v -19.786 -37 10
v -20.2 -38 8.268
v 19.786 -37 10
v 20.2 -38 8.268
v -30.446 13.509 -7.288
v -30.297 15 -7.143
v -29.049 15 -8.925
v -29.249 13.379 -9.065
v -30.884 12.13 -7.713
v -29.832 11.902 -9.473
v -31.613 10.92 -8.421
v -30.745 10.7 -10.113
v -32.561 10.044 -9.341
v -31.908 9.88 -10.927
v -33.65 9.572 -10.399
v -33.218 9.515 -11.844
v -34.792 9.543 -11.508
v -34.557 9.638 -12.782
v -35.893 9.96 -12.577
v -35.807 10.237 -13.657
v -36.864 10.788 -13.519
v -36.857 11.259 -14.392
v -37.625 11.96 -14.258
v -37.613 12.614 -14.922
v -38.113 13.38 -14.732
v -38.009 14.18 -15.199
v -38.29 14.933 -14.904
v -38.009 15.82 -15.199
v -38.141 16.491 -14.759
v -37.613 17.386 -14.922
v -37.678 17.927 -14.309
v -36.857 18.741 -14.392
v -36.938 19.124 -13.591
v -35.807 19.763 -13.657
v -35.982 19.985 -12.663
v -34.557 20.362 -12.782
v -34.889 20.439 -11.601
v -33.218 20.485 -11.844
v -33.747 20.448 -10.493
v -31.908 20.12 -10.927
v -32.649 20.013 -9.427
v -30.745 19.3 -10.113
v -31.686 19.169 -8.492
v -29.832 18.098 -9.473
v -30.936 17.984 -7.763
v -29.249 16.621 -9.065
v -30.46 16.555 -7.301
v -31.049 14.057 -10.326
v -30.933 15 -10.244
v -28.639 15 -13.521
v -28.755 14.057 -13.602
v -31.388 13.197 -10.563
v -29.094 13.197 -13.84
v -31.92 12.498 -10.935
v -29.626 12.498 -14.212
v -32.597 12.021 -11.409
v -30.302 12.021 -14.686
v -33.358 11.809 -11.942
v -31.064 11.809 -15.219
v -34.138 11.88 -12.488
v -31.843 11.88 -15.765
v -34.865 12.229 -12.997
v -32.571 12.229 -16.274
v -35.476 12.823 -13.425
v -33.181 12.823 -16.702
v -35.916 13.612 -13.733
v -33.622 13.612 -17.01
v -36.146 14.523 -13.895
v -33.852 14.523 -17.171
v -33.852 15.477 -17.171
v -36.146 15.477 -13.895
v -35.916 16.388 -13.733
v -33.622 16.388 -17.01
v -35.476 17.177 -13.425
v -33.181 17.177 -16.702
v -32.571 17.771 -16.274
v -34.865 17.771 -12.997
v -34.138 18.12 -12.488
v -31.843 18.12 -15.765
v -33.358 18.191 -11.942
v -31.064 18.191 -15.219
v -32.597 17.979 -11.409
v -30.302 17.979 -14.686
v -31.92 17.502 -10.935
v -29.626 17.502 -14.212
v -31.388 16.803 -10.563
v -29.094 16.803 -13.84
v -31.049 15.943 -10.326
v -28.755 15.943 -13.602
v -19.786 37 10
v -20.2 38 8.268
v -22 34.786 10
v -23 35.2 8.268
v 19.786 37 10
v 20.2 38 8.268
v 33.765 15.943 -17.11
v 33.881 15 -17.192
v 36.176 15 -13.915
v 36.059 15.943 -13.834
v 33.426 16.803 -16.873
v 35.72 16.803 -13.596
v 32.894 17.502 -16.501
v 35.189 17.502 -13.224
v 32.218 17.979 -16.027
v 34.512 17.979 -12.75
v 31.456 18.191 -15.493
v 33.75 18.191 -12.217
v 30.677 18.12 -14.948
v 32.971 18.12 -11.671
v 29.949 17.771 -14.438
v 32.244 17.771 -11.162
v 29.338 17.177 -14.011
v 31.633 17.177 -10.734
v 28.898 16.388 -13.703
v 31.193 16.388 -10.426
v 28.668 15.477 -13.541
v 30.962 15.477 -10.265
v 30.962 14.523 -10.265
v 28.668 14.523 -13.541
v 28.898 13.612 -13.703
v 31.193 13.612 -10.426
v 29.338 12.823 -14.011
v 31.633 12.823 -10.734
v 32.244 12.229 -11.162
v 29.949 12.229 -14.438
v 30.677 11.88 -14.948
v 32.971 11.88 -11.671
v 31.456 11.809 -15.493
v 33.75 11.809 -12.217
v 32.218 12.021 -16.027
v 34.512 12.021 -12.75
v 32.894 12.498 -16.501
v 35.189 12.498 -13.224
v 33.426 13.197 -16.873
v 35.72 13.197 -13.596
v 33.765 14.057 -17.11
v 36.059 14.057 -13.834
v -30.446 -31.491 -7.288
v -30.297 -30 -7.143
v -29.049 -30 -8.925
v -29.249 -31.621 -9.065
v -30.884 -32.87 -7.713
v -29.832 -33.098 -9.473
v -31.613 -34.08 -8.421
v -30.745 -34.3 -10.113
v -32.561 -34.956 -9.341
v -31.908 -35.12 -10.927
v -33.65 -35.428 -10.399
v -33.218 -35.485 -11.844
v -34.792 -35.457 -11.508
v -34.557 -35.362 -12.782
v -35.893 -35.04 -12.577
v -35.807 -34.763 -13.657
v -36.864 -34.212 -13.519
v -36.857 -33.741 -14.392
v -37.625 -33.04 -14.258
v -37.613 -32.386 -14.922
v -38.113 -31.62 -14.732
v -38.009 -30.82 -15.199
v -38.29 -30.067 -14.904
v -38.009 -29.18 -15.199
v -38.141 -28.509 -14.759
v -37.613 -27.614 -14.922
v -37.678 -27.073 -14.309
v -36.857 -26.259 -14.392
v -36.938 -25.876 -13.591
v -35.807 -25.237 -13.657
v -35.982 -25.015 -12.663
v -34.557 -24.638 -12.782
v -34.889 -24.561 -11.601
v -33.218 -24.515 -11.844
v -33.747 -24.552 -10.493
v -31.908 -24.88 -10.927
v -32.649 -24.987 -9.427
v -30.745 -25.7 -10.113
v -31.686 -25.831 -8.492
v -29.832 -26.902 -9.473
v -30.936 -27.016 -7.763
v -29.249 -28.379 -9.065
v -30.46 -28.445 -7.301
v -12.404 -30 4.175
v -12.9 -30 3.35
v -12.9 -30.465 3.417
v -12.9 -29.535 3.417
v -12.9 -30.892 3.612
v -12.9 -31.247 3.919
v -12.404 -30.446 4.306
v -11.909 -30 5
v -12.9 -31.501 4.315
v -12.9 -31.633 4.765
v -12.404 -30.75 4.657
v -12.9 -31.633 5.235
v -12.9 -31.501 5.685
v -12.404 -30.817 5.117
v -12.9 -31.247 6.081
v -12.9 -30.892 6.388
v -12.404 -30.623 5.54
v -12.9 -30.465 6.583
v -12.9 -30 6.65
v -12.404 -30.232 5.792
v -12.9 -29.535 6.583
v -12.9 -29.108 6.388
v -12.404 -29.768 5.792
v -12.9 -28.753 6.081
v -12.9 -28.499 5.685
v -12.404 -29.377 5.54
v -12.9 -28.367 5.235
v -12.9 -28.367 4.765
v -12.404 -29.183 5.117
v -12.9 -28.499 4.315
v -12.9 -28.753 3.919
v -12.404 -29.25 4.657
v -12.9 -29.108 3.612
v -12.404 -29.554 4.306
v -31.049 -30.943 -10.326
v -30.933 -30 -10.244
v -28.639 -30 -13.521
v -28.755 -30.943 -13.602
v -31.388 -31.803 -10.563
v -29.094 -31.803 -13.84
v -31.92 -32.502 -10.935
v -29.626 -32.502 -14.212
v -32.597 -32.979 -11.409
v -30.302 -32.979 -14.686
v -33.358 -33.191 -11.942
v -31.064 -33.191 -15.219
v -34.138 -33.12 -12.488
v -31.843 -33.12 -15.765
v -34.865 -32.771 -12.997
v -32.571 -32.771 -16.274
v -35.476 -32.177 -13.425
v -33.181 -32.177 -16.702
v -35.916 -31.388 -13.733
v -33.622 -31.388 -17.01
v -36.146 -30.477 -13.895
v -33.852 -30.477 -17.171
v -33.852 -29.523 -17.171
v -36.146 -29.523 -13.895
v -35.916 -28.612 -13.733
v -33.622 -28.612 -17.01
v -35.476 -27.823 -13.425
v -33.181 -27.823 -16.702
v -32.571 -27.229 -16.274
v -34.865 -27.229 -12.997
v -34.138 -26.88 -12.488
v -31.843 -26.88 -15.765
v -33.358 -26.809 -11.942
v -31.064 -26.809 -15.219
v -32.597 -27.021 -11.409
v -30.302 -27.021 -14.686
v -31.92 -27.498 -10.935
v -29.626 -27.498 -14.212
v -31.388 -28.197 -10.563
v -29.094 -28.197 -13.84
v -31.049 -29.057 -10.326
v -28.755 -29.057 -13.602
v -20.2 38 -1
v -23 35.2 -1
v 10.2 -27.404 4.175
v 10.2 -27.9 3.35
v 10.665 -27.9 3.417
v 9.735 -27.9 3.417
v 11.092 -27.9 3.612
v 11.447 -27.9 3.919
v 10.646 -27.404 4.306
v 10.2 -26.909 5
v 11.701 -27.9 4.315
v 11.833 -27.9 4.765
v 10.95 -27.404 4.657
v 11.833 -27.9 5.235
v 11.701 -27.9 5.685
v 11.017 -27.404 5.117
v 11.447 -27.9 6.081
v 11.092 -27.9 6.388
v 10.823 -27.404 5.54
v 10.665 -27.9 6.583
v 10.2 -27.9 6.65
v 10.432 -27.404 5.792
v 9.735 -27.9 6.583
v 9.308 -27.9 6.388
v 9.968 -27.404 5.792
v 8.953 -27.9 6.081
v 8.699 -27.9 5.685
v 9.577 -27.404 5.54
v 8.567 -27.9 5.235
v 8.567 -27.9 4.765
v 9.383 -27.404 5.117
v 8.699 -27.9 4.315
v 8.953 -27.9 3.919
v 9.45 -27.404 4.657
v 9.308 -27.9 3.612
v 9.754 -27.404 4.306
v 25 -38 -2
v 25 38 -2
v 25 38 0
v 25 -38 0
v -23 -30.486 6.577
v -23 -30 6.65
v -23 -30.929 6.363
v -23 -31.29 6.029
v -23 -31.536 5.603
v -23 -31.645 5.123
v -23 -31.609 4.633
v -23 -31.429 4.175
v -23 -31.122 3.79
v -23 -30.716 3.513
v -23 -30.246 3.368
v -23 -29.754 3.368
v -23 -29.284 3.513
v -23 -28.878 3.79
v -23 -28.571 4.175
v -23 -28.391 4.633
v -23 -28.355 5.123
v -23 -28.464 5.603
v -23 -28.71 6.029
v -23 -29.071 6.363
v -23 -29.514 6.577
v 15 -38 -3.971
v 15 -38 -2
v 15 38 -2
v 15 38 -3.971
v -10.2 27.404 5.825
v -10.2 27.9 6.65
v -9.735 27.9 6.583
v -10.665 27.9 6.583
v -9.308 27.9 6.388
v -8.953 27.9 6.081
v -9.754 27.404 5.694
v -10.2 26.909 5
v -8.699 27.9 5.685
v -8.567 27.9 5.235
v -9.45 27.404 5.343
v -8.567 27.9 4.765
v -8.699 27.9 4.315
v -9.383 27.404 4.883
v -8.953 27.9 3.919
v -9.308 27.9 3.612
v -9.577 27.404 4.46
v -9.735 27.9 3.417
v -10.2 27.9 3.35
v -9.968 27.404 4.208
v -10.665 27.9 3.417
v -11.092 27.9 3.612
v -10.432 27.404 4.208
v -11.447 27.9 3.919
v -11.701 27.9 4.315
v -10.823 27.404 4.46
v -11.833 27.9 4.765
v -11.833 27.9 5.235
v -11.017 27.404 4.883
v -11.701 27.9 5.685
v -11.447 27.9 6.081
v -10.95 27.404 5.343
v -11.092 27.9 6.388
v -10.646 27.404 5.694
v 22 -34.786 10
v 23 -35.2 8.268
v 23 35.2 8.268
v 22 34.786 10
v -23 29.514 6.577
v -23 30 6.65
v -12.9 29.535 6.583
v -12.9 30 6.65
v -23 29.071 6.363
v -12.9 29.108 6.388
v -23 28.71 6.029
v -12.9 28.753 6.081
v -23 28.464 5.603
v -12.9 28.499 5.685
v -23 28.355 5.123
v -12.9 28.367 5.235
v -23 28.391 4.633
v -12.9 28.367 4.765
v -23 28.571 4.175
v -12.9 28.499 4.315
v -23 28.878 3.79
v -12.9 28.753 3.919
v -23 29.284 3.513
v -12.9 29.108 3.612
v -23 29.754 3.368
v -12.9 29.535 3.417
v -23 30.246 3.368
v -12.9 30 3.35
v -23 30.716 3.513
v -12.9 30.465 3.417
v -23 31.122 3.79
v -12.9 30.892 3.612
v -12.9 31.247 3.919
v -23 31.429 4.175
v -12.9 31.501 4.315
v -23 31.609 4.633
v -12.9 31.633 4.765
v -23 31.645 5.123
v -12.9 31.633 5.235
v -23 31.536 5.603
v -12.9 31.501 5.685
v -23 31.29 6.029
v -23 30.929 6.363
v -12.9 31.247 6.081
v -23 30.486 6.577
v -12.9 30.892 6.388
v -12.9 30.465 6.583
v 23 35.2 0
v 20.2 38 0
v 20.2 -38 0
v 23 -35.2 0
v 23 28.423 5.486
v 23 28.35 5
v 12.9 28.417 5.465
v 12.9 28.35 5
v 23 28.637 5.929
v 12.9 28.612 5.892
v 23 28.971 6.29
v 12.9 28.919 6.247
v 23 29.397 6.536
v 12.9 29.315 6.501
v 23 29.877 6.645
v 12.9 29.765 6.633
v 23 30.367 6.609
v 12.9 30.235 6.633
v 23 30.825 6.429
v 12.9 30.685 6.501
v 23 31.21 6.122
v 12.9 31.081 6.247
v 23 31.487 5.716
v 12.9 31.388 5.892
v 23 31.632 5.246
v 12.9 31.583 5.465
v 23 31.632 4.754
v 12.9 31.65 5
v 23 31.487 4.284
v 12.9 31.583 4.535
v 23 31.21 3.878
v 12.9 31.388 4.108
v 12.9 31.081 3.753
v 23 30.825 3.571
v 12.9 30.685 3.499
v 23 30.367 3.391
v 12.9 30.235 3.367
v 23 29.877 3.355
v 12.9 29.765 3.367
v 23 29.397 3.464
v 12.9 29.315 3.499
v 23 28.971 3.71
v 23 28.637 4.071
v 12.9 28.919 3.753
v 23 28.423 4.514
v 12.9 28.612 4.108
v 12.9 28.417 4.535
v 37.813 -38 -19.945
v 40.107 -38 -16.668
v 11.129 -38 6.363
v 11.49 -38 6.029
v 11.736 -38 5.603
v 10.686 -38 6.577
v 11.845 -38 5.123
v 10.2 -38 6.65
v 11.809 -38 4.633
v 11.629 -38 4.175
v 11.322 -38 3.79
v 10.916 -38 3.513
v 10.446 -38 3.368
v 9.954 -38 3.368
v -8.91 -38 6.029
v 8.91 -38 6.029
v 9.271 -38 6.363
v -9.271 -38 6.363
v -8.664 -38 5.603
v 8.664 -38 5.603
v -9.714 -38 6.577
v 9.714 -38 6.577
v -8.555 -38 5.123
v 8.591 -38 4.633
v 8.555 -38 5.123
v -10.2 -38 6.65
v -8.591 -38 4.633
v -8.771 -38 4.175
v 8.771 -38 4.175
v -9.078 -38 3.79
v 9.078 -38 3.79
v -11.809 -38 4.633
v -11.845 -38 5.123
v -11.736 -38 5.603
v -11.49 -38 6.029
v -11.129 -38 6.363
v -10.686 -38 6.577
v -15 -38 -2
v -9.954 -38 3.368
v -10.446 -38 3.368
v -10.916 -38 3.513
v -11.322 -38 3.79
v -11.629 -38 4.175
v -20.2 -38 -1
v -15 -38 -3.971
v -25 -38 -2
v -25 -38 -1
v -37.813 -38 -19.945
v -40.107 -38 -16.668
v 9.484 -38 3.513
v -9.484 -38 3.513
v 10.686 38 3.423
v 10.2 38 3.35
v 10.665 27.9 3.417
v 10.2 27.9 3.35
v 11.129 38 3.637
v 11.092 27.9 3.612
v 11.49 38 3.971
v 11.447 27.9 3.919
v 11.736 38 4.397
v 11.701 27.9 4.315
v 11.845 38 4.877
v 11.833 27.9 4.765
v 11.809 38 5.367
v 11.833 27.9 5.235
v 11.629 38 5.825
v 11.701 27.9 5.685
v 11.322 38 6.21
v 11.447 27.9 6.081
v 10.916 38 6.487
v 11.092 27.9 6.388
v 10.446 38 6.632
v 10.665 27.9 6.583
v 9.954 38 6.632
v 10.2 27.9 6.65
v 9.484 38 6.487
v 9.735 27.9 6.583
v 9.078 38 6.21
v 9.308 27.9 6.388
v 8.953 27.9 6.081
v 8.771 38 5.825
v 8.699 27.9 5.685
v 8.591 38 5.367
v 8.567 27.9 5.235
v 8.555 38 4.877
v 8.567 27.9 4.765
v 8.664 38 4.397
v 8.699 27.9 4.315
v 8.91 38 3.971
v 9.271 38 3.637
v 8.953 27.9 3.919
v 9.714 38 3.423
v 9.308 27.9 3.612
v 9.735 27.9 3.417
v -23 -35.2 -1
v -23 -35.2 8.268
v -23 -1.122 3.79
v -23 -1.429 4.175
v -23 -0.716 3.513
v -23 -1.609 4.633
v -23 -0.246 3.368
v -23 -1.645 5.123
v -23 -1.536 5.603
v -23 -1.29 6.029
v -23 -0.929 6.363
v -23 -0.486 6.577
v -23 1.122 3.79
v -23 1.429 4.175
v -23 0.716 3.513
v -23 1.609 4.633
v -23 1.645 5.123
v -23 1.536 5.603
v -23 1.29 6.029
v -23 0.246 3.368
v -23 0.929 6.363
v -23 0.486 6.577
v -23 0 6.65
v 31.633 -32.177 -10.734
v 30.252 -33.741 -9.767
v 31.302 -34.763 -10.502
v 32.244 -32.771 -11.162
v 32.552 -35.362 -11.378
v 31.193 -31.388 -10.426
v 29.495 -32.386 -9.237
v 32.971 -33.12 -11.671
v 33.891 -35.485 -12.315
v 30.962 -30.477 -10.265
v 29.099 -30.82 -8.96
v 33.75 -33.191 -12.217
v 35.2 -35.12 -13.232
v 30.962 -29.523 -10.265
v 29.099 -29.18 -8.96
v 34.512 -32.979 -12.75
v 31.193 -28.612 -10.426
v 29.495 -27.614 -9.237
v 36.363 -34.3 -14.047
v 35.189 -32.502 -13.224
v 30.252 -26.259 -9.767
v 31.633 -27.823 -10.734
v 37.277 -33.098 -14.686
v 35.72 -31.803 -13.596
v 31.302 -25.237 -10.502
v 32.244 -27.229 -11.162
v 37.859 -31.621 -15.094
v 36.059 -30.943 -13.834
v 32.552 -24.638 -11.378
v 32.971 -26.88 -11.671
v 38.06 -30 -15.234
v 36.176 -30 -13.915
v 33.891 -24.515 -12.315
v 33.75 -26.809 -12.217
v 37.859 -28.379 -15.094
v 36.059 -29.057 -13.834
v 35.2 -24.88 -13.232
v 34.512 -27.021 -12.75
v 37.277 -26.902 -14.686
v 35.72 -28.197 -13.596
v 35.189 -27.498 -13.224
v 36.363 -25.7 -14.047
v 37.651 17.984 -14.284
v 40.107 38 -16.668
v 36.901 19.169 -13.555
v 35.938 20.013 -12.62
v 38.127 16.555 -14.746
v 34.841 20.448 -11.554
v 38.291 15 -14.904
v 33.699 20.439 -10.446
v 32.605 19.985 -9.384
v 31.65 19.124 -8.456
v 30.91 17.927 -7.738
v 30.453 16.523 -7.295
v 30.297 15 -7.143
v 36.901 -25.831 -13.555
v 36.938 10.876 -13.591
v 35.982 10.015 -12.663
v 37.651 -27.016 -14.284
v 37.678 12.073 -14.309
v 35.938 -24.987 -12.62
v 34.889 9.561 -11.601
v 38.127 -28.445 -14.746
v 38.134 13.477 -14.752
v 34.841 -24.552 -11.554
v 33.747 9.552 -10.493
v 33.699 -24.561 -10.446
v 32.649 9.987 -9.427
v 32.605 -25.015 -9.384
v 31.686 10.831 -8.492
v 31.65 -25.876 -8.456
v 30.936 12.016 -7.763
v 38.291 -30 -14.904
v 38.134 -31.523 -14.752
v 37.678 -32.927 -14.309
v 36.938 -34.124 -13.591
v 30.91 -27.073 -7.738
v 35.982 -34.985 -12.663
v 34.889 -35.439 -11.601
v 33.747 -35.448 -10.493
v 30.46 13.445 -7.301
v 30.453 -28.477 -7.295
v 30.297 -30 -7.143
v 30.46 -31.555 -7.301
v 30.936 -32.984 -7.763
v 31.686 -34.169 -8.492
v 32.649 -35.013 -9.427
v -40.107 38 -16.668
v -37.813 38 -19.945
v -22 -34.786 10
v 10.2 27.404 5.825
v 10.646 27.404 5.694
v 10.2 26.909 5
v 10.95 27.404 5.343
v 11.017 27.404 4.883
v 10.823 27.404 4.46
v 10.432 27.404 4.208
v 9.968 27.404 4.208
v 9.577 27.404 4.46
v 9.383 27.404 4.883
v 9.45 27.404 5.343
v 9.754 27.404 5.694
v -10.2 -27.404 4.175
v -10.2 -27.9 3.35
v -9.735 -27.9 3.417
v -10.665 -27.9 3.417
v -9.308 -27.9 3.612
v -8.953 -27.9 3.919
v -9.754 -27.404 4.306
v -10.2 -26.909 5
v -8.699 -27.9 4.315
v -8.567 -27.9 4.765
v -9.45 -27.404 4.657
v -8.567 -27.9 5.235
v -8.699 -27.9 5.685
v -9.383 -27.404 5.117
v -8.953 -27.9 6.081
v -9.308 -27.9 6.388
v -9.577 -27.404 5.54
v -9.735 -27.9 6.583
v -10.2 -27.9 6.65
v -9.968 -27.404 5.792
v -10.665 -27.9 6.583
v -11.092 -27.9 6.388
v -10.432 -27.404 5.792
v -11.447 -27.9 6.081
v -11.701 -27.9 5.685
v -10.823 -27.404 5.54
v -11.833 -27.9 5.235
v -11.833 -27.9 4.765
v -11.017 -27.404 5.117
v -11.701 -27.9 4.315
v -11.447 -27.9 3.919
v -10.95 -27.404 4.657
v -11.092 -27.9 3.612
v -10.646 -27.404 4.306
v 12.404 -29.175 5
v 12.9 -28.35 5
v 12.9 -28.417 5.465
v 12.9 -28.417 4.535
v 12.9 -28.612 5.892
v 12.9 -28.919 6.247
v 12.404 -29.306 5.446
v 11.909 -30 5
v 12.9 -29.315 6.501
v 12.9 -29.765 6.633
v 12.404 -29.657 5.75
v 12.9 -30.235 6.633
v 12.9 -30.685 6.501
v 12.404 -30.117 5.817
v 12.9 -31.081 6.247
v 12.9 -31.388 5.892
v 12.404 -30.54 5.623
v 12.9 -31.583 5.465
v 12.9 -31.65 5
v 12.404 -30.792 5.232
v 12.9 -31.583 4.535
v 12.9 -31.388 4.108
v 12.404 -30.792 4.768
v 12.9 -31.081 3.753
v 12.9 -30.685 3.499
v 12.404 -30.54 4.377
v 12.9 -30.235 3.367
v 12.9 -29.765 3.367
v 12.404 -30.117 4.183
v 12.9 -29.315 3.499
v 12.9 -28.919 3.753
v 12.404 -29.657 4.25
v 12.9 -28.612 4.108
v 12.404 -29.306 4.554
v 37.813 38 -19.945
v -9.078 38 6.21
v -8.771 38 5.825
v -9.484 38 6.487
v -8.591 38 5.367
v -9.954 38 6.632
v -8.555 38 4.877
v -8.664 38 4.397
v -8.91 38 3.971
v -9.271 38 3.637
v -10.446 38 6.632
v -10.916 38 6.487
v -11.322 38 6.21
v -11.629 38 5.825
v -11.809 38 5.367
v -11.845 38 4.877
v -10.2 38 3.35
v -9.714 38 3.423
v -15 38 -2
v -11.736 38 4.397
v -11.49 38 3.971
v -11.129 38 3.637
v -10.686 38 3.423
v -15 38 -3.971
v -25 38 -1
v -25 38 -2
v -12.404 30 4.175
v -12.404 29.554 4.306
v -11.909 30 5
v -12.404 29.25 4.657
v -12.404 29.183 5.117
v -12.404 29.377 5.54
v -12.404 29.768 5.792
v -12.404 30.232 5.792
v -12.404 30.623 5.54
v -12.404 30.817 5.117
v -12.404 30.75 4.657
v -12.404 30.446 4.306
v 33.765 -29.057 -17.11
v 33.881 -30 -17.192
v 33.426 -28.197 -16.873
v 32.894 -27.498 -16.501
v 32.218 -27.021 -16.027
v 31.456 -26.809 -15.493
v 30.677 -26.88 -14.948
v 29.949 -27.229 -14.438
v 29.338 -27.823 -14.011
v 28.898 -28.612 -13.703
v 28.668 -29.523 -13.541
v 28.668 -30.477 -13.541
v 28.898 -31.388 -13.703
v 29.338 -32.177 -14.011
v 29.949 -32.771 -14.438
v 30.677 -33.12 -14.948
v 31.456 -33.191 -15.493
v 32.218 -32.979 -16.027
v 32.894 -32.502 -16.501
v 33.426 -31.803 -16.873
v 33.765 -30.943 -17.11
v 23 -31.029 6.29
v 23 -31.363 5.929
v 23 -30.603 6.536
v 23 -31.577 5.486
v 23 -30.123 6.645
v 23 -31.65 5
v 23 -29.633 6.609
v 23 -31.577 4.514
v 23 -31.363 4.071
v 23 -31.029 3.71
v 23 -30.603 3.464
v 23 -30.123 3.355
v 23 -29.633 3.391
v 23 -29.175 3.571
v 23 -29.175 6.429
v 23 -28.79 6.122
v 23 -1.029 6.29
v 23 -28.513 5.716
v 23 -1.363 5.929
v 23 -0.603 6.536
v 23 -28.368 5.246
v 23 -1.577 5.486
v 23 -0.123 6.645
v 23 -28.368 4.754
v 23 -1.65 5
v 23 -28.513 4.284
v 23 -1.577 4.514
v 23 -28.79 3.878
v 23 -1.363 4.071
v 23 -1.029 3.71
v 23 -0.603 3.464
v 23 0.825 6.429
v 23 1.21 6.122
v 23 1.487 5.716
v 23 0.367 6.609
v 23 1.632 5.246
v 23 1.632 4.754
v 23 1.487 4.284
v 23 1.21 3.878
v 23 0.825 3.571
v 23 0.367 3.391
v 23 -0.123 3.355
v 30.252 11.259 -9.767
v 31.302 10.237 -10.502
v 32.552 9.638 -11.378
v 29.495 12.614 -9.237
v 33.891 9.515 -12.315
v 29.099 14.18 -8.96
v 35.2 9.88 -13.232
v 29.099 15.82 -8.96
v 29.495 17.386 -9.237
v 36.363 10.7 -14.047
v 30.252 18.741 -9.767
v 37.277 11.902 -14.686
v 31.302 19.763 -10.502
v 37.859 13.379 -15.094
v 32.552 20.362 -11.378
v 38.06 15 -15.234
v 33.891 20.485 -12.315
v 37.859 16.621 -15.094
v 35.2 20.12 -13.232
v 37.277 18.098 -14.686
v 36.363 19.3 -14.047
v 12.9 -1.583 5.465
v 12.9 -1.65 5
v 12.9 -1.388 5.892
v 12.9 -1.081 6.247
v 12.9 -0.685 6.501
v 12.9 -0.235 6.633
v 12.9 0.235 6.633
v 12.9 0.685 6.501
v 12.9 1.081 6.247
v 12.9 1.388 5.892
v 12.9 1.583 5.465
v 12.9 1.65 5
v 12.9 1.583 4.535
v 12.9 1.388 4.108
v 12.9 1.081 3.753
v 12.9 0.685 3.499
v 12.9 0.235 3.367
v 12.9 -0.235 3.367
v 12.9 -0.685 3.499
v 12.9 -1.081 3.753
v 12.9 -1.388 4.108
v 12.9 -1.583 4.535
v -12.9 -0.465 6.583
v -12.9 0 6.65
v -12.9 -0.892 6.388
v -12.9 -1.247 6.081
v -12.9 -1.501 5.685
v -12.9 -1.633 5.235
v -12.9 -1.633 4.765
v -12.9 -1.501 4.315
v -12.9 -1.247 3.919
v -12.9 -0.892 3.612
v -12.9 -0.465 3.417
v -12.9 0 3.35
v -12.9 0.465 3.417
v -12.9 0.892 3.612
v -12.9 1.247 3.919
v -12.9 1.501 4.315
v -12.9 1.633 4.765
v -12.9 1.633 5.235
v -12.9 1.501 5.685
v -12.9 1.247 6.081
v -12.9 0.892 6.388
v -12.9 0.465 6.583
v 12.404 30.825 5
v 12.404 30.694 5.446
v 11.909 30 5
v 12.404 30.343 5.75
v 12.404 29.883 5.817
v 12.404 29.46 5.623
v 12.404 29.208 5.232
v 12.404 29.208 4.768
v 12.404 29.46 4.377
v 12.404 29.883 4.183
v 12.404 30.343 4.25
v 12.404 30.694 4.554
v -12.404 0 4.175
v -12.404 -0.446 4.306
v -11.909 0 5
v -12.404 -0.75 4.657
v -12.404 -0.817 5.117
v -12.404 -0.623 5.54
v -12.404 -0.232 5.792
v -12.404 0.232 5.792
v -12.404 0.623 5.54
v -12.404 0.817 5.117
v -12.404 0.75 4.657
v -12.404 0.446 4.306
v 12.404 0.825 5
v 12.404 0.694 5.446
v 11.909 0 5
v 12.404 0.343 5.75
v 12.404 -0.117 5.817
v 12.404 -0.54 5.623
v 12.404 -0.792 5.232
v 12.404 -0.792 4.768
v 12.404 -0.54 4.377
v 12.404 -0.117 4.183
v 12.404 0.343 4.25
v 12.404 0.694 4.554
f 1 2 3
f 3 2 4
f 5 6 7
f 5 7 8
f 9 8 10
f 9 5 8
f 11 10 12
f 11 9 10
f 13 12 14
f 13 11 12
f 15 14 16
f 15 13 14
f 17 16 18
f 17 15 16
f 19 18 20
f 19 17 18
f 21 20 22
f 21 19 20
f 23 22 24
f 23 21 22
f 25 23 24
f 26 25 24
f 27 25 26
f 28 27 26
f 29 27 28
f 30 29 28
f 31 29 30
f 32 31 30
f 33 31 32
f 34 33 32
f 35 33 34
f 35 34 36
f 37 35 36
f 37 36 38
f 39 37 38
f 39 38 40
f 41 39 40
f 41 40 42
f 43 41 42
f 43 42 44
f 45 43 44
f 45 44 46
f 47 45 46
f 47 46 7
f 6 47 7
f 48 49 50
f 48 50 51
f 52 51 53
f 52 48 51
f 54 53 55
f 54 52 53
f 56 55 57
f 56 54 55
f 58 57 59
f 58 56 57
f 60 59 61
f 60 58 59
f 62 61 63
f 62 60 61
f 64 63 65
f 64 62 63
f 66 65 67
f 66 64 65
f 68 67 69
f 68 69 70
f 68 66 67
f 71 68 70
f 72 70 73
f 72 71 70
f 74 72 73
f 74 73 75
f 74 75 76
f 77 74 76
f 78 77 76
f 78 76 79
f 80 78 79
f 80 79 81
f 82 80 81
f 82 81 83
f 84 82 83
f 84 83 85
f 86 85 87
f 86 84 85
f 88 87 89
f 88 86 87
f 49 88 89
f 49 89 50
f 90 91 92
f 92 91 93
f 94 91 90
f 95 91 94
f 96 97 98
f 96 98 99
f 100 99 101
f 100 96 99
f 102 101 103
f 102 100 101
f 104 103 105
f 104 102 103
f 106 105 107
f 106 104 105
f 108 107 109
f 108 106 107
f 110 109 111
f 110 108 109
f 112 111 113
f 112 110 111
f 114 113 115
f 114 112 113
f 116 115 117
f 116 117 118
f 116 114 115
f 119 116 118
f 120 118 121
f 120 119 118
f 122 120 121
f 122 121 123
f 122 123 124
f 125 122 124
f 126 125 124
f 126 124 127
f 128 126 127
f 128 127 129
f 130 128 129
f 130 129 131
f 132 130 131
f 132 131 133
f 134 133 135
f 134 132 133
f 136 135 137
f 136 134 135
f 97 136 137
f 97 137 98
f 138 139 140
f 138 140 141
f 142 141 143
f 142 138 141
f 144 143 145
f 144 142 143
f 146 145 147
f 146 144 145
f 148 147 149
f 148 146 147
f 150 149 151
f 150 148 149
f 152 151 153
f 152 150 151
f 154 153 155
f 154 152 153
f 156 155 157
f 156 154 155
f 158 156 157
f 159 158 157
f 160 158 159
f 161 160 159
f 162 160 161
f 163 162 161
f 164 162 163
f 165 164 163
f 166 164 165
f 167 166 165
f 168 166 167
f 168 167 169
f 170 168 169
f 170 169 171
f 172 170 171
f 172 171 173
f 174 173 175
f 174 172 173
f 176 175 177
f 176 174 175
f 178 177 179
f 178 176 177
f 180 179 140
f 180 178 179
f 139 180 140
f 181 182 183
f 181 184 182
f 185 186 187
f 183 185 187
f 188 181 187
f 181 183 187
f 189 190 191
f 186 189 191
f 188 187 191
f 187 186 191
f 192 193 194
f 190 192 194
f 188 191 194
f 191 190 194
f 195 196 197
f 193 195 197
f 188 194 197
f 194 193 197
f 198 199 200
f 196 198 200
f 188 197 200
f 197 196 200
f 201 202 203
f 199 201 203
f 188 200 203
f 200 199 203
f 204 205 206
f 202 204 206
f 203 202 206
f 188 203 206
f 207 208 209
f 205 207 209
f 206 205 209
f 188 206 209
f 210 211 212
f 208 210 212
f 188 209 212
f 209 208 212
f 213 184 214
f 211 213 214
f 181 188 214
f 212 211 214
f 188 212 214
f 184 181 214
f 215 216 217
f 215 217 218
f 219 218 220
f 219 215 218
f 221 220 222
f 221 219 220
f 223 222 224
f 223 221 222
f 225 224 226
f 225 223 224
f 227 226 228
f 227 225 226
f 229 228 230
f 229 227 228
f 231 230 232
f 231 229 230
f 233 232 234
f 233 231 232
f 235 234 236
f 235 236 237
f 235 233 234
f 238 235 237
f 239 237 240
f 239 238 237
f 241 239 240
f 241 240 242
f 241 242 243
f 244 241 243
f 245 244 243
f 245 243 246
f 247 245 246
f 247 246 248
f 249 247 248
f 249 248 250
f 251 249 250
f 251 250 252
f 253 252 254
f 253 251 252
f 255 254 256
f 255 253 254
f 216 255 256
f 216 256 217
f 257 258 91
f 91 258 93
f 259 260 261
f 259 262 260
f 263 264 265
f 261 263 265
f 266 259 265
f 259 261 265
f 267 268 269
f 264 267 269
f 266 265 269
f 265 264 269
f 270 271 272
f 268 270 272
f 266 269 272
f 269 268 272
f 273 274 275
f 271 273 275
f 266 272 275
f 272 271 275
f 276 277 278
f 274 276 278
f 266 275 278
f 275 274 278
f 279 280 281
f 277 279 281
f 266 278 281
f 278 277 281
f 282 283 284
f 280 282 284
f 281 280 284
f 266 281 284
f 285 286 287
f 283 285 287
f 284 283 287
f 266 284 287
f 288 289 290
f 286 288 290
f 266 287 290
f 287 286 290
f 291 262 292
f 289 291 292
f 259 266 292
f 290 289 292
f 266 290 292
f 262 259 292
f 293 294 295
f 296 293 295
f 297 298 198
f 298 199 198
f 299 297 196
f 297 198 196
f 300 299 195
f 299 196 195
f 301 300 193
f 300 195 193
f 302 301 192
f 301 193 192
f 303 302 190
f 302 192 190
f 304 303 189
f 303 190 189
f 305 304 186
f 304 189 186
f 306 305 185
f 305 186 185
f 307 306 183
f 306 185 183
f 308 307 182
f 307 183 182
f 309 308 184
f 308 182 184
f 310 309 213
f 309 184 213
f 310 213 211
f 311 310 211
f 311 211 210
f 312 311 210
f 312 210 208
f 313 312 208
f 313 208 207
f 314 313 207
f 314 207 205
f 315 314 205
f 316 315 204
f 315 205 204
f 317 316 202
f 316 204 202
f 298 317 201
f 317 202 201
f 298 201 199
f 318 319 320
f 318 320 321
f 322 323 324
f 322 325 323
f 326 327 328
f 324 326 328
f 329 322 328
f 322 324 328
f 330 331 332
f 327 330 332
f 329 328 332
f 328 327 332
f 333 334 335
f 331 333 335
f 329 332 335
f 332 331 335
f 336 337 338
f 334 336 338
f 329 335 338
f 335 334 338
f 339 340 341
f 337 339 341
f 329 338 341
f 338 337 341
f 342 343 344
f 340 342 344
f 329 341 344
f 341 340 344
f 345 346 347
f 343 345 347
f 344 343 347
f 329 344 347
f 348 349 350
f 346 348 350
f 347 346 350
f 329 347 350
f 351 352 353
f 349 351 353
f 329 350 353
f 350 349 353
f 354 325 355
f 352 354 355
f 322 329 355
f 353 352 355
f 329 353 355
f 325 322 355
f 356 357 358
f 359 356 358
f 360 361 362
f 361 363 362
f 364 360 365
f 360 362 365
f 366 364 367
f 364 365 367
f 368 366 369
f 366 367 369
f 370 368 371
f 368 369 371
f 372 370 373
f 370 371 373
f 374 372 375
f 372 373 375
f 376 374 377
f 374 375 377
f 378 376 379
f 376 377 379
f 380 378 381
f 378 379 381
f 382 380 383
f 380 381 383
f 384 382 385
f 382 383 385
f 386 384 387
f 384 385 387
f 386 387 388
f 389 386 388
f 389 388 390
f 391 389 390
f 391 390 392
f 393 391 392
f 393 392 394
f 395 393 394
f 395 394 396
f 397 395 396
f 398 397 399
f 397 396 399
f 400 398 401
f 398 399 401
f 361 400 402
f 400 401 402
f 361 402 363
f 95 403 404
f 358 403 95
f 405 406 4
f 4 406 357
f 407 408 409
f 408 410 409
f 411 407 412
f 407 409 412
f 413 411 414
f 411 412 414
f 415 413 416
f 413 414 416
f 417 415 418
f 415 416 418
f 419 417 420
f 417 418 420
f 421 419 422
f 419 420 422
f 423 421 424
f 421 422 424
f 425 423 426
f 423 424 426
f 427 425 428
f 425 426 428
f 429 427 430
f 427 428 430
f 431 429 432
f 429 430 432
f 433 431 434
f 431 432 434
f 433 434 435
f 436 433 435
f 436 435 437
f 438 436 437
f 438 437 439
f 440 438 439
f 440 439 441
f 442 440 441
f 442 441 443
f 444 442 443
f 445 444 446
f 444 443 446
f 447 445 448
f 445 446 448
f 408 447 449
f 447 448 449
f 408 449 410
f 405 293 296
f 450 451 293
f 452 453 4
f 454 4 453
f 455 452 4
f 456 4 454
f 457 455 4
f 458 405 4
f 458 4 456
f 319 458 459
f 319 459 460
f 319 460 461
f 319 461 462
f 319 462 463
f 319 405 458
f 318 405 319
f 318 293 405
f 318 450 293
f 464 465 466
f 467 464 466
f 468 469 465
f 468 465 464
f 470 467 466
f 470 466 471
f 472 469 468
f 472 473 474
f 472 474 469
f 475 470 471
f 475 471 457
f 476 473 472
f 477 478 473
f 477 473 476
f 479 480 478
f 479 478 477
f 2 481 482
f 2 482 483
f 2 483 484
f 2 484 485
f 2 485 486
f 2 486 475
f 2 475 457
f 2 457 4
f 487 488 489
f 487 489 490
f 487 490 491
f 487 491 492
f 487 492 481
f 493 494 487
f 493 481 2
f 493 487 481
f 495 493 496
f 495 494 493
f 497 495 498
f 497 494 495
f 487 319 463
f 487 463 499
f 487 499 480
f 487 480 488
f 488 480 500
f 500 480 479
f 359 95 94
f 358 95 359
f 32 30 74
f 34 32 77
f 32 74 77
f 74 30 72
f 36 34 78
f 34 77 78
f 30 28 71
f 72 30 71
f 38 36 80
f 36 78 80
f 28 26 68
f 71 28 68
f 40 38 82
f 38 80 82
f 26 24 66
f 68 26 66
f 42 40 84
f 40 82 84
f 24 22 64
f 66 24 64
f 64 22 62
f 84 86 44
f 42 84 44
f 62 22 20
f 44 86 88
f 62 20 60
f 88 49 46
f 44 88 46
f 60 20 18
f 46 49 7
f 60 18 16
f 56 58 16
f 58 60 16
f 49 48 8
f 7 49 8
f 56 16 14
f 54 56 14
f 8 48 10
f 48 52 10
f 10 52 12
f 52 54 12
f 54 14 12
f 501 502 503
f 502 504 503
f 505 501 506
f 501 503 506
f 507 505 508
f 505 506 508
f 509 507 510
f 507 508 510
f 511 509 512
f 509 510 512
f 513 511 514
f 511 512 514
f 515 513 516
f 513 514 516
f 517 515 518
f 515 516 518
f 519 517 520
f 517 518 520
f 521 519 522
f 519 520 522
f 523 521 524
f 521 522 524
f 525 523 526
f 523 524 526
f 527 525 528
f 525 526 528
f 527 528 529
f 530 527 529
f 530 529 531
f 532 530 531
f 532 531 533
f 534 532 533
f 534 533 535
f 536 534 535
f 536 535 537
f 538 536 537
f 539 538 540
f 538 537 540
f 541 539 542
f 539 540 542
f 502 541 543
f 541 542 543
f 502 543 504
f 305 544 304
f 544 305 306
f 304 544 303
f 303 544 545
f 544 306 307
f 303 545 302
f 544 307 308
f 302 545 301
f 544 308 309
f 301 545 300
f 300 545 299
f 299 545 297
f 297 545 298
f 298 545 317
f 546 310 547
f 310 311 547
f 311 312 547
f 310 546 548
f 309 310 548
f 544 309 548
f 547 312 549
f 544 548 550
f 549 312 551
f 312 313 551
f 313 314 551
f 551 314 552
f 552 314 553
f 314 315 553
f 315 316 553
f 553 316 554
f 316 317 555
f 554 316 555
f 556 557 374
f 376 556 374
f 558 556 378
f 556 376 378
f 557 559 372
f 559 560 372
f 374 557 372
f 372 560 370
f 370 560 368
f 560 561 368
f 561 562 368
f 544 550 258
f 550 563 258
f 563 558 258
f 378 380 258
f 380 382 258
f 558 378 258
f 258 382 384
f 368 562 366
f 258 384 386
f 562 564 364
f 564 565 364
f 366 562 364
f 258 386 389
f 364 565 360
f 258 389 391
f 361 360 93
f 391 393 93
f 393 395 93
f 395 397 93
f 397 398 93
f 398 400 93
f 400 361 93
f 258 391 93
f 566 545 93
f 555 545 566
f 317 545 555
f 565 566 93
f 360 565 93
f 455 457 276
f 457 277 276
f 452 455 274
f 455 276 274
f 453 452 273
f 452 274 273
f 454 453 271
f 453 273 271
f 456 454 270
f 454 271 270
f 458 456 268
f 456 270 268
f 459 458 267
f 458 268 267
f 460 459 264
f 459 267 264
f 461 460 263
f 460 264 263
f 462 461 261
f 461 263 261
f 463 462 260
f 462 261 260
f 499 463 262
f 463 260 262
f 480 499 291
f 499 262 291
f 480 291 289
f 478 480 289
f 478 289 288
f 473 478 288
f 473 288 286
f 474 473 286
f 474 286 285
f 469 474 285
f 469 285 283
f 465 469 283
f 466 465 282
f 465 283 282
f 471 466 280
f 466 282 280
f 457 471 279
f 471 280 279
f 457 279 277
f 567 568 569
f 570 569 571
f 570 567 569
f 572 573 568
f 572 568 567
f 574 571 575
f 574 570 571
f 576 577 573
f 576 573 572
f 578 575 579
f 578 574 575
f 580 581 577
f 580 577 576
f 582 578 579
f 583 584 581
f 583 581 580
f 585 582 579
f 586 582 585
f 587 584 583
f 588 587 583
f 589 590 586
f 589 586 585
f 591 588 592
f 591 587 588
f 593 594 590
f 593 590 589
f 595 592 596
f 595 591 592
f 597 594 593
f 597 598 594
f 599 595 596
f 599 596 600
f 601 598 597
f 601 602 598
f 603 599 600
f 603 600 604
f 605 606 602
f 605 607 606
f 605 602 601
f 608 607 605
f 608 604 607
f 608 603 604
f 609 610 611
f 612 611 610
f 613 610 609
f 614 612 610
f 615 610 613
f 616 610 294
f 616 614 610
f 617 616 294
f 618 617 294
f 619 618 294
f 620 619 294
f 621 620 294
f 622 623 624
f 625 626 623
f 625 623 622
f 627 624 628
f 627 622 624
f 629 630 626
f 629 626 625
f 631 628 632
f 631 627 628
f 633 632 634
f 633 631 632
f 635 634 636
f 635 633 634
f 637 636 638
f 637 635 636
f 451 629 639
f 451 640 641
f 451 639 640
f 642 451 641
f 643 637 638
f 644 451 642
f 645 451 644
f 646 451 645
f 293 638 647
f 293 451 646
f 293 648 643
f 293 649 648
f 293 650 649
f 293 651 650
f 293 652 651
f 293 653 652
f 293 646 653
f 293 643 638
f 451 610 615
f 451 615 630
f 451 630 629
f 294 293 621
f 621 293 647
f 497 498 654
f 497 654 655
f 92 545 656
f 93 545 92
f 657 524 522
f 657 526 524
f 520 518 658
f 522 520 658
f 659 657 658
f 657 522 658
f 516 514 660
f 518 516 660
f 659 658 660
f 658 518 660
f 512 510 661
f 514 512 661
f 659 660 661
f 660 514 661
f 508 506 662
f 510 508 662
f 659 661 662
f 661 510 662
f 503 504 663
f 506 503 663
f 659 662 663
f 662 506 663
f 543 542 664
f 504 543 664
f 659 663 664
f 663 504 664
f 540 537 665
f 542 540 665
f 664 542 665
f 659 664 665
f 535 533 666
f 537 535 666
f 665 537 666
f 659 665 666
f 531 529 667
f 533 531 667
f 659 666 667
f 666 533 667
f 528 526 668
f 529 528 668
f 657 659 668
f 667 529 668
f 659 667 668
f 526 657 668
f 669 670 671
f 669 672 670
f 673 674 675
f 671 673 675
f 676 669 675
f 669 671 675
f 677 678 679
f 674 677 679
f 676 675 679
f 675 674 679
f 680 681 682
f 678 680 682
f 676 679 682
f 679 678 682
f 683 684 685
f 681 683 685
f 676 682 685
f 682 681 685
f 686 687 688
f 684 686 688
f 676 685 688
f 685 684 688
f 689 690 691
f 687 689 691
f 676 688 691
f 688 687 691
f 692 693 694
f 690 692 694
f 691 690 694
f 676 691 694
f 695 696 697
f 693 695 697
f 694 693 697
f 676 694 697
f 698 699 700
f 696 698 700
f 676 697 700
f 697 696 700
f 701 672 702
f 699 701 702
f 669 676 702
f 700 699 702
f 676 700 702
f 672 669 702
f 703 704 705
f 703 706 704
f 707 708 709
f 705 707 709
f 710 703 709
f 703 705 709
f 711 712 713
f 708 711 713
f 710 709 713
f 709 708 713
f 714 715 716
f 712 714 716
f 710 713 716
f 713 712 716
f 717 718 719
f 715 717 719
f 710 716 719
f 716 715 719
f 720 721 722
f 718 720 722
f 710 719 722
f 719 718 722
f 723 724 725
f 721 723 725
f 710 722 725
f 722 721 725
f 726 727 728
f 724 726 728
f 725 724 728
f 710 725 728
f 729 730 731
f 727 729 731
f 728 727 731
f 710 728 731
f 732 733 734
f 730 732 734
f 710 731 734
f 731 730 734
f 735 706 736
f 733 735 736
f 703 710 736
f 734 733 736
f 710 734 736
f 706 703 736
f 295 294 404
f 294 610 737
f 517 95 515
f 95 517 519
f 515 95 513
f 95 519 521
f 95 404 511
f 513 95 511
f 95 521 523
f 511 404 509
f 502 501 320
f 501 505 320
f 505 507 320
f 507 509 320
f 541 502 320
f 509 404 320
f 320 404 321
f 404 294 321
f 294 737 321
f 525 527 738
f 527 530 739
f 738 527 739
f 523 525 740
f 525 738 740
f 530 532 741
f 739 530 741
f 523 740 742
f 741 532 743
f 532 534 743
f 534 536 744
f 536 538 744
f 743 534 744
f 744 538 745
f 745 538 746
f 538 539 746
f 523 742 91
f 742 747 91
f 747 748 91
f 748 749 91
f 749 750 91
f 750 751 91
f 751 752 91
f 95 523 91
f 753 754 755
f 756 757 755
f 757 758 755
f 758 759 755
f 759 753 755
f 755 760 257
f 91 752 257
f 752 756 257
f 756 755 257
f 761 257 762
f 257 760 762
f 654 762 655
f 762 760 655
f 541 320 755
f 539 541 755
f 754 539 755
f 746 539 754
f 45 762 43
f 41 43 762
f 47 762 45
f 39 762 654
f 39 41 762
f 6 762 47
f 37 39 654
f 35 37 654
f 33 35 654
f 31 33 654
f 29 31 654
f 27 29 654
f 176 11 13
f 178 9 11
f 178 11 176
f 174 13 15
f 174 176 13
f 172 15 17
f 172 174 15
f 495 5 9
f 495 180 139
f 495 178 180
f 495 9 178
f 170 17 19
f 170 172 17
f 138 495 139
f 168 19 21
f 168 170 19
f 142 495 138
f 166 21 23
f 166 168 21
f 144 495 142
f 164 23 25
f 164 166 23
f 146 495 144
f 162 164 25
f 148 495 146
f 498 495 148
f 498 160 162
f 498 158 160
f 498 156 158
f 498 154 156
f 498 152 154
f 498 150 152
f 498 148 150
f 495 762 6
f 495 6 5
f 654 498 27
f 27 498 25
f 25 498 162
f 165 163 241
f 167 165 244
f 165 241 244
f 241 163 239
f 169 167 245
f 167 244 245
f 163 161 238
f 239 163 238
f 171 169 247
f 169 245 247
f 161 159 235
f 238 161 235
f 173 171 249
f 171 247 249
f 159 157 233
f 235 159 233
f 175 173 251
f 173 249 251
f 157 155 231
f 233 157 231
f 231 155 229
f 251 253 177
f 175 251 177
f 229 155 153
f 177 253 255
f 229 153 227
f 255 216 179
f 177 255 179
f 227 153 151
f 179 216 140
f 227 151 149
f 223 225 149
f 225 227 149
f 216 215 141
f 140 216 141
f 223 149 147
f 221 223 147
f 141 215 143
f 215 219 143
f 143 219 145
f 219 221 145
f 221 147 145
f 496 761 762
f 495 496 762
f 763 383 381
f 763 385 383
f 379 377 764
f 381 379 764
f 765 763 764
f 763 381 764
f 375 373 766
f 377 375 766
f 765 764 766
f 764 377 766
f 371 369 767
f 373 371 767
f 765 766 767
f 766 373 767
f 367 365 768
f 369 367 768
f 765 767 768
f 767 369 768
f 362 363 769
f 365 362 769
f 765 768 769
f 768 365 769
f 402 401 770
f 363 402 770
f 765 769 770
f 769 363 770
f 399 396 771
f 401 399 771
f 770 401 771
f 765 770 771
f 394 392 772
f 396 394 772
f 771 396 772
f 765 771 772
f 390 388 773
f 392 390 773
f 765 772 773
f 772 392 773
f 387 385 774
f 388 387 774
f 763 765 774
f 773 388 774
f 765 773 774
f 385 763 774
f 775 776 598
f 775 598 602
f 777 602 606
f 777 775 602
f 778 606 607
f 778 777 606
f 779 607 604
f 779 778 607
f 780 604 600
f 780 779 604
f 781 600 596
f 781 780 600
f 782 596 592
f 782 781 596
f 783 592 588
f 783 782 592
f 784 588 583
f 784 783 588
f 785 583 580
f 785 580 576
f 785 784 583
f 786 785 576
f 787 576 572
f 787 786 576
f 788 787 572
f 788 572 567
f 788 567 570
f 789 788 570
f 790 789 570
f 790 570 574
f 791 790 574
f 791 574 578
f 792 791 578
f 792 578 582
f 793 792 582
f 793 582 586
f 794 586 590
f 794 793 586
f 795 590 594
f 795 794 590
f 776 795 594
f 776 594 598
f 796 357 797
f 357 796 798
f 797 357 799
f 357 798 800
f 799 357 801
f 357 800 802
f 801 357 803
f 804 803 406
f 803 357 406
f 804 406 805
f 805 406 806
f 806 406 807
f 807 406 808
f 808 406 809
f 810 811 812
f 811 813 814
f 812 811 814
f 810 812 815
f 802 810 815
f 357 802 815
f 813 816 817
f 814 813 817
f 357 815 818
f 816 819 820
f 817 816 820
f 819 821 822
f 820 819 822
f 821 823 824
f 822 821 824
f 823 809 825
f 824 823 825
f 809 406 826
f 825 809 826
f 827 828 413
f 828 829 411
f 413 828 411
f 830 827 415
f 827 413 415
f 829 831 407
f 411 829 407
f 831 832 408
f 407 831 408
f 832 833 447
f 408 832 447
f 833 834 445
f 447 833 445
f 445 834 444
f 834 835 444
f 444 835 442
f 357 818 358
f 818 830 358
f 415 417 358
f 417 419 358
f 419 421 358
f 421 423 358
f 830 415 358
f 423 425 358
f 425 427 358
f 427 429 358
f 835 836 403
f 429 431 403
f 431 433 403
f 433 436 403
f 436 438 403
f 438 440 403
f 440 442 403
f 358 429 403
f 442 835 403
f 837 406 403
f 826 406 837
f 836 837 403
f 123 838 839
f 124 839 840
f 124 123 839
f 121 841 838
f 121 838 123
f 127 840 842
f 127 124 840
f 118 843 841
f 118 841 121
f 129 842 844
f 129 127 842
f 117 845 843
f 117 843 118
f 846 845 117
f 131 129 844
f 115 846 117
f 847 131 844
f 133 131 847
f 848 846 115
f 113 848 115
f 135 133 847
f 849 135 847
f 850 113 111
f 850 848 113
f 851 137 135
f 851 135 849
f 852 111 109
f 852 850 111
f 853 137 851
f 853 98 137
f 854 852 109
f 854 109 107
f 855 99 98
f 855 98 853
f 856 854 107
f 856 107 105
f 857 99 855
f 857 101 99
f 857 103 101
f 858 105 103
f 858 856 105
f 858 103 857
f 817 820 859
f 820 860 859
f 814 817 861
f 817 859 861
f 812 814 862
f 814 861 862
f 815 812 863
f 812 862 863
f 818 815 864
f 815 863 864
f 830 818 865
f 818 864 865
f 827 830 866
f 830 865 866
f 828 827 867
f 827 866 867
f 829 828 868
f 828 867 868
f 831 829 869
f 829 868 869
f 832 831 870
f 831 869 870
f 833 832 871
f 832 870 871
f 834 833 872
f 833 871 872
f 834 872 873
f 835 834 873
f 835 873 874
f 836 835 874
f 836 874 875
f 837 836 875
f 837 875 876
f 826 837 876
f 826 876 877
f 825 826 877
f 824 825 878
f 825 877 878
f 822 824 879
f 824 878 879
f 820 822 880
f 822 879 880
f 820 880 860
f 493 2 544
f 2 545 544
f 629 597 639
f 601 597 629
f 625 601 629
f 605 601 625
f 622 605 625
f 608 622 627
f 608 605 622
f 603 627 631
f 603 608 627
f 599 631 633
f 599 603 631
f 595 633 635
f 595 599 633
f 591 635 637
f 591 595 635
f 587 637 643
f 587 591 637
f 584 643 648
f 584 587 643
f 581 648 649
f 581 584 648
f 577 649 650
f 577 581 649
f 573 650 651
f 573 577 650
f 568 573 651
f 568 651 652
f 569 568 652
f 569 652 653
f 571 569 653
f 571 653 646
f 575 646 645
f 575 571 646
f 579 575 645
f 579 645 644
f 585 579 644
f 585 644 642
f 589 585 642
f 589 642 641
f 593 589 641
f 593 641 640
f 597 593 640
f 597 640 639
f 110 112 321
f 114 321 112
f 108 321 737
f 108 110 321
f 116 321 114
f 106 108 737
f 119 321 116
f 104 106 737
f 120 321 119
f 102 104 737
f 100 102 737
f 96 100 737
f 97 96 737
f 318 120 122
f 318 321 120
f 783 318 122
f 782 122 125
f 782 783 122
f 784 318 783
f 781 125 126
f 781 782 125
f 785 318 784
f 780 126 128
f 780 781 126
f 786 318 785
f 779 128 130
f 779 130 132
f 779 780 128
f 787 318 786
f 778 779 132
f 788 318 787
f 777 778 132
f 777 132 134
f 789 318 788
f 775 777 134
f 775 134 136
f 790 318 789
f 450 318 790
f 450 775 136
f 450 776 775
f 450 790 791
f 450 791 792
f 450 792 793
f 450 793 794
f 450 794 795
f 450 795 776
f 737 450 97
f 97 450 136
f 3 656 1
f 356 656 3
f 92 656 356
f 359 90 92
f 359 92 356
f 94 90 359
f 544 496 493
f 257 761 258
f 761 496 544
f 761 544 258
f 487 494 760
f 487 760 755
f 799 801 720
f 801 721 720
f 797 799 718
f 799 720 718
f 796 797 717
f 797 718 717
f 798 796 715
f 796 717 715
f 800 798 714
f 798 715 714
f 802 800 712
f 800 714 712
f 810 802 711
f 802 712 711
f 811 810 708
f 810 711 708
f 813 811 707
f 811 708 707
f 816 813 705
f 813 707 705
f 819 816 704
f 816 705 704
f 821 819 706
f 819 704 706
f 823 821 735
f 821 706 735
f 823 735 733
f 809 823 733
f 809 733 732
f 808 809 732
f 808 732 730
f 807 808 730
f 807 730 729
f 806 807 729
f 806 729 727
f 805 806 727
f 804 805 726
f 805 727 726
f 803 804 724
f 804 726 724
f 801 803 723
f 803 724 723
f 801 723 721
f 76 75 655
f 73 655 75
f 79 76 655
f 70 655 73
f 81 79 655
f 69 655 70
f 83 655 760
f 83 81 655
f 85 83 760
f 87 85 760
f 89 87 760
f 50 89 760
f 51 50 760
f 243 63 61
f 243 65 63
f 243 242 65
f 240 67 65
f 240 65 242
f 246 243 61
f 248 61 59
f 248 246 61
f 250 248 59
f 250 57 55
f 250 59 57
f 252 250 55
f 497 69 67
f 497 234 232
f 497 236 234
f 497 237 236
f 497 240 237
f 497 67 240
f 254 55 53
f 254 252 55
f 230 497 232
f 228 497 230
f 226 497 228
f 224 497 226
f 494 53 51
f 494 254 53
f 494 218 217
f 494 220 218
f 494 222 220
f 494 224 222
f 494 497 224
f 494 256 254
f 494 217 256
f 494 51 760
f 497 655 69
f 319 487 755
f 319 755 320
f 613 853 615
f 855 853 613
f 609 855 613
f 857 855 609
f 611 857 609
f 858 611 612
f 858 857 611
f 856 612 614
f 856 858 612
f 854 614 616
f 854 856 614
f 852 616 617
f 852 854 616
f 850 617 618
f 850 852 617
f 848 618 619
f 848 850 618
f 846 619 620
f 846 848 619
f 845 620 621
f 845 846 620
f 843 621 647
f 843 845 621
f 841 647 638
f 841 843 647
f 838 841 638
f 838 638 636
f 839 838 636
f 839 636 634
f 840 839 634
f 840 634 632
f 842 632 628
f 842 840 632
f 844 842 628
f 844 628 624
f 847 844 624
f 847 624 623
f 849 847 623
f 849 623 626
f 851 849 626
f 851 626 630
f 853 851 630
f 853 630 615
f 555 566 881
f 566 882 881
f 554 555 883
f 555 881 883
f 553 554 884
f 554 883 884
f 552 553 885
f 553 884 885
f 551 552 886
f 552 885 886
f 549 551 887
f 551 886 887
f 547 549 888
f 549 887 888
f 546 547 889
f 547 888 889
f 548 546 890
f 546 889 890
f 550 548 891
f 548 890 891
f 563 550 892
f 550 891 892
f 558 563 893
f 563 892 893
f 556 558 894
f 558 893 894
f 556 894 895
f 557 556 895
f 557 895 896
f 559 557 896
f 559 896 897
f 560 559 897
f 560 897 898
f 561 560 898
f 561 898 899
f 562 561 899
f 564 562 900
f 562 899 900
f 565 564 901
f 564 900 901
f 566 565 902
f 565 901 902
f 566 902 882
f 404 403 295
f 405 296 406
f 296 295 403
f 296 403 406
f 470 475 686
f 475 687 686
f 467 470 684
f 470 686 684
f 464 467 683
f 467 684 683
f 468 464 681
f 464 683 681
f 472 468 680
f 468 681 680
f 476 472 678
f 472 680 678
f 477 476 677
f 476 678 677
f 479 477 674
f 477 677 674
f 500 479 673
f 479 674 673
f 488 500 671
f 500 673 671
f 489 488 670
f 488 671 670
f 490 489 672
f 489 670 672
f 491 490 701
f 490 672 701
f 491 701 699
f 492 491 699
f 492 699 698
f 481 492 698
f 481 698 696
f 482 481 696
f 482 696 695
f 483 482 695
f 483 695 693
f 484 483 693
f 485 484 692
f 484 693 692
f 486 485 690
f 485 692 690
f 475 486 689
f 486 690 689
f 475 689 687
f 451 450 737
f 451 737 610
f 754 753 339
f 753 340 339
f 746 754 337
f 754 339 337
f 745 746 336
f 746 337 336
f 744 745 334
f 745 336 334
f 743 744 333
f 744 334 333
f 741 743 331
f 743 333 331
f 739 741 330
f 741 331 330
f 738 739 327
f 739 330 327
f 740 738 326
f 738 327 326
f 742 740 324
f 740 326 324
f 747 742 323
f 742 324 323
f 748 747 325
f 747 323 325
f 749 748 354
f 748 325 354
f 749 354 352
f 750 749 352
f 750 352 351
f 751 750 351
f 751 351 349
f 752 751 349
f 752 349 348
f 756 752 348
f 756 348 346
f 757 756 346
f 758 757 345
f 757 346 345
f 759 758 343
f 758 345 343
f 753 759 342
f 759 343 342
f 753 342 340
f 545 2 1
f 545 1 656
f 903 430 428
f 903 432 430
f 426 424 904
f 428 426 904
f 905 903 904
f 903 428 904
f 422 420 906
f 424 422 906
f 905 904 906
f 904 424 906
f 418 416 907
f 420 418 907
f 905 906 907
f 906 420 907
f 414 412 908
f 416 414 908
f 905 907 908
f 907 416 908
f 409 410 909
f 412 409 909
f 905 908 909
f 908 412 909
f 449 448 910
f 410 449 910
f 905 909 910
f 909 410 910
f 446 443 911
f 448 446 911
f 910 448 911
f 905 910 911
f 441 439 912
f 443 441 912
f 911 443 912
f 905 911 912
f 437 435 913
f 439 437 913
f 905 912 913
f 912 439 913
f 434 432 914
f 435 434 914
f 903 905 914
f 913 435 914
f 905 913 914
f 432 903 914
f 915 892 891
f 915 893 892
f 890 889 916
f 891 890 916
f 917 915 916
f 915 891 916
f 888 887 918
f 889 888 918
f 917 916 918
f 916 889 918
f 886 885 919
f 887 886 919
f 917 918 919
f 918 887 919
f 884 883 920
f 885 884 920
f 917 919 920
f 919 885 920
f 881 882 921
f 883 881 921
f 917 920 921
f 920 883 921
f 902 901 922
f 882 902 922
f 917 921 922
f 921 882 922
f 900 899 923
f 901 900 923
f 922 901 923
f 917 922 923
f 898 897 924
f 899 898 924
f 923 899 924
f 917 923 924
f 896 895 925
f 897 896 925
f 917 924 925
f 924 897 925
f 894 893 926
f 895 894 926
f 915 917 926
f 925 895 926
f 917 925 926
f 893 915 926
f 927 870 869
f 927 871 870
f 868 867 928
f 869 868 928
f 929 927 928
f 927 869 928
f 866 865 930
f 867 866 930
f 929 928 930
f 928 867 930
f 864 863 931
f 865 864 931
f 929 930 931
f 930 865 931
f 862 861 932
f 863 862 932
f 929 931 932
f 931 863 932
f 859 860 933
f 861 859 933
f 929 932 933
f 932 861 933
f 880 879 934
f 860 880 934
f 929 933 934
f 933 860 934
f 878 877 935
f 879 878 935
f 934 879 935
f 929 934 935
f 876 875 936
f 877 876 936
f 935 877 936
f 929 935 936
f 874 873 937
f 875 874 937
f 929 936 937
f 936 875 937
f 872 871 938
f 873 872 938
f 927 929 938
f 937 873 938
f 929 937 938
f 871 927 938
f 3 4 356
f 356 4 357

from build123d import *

# Parameters (mm, degrees)
BOSS_EXTRUDE1_DEPTH             = 38
BOSS_EXTRUDE1_DEPTH_BACK        = 38
SKETCH2_W                       = 46
SKETCH2_H                       = 76
BOSS_EXTRUDE2_DEPTH             = 10
ADVANCEDHOLE1_START             = 9.350877343
ADVANCEDHOLE1_OUTLINE_R         = 5.5
ADVANCEDHOLE1_DEPTH             = 2.175616923
ADVANCEDHOLE1_START_2           = 5.350877343
ADVANCEDHOLE1_2_OUTLINE_R       = 3.2
ADVANCEDHOLE1_2_DEPTH           = 4
ADVANCEDHOLE2_START             = -11.526494266
ADVANCEDHOLE2_OUTLINE_R         = 5.5
ADVANCEDHOLE2_DEPTH             = 2.175616923
ADVANCEDHOLE2_START_2           = -9.350877343
ADVANCEDHOLE2_2_OUTLINE_R       = 3.2
ADVANCEDHOLE2_2_DEPTH           = 4
SKETCH11_W                      = 2
SKETCH11_H                      = 76
CUT_EXTRUDE1_DEPTH              = 1
M4_TAPPED_HOLE1_D               = 3.3
M4_TAPPED_HOLE1_DEPTH           = 10.1
M4_TAPPED_HOLE1_TIP             = 0.991420021
M4_TAPPED_HOLE1_ON_FACE_2_D     = 3.3
M4_TAPPED_HOLE1_ON_FACE_2_DEPTH = 10.1
M4_TAPPED_HOLE1_ON_FACE_2_TIP   = 0.991420021
M4_TAPPED_HOLE1_ON_FACE_3_D     = 3.3
M4_TAPPED_HOLE1_ON_FACE_3_DEPTH = 10.1
M4_TAPPED_HOLE1_ON_FACE_3_TIP   = 0.991420021
M4_TAPPED_HOLE1_ON_FACE_4_D     = 3.3
M4_TAPPED_HOLE1_ON_FACE_4_DEPTH = 10.1
M4_TAPPED_HOLE1_ON_FACE_4_TIP   = 0.991420021
CHAMFER1_SIZE                   = 2.8
CHAMFER2_SIZE                   = 1
CHAMFER2_SIZE2                  = 1.732050808


# Read off the part's stored shape, not the designer's step: AdvancedHole1, AdvancedHole2
with BuildPart() as part:
    # Sketch1 → Boss-Extrude1 (new, two sides: drawn at the far end of the back side and taken through both)
    with BuildSketch(Plane(origin=(0, 0, 0), x_dir=(1, 0, 0), z_dir=(0, 1, 0)).offset(-BOSS_EXTRUDE1_DEPTH_BACK)):
        Polygon((-25, 2), (-40.107437881, 16.6682169), (-37.813132135, 19.944825077), (-15, 3.970897986), (-15, 2), (15, 2), (15, 3.970897986), (37.813132135, 19.944825077), (40.107437881, 16.6682169), (25, 2), (25, 0), (-25, 0), align=None)
    extrude(amount=BOSS_EXTRUDE1_DEPTH + BOSS_EXTRUDE1_DEPTH_BACK)

    # Sketch2 → Boss-Extrude2 (add)
    with BuildSketch(Plane.XY):
        Rectangle(SKETCH2_W, SKETCH2_H)
    extrude(amount=BOSS_EXTRUDE2_DEPTH)

    # AdvancedHole1 outline → AdvancedHole1 (cut)
    with BuildSketch(Plane(origin=(0, 0, 0), x_dir=(0.819152044288991, 0, -0.5735764363510472), z_dir=(0.5735764363510472, 0, 0.8191520442889911)).offset(ADVANCEDHOLE1_START)):
        with Locations((34.414586181, -30)):
            Circle(ADVANCEDHOLE1_OUTLINE_R)
        with Locations((34.414586181, 15)):
            Circle(ADVANCEDHOLE1_OUTLINE_R)
    extrude(amount=ADVANCEDHOLE1_DEPTH, mode=Mode.SUBTRACT)

    # AdvancedHole1 2 outline → AdvancedHole1 2 (cut)
    with BuildSketch(Plane(origin=(0, 0, 0), x_dir=(0.819152044288991, 0, -0.5735764363510472), z_dir=(0.5735764363510472, 0, 0.8191520442889911)).offset(ADVANCEDHOLE1_START_2)):
        with Locations((34.414586181, -30)):
            Circle(ADVANCEDHOLE1_2_OUTLINE_R)
        with Locations((34.414586181, 15)):
            Circle(ADVANCEDHOLE1_2_OUTLINE_R)
    extrude(amount=ADVANCEDHOLE1_2_DEPTH, mode=Mode.SUBTRACT)

    # AdvancedHole2 outline → AdvancedHole2 (cut)
    with BuildSketch(Plane(origin=(0, 0, 0), x_dir=(0.819152044288991, 0, 0.5735764363510472), z_dir=(0.5735764363510472, 0, -0.8191520442889911)).offset(ADVANCEDHOLE2_START)):
        with Locations((-34.414586181, 30)):
            Circle(ADVANCEDHOLE2_OUTLINE_R)
        with Locations((-34.414586181, -15)):
            Circle(ADVANCEDHOLE2_OUTLINE_R)
    extrude(amount=ADVANCEDHOLE2_DEPTH, mode=Mode.SUBTRACT)

    # AdvancedHole2 2 outline → AdvancedHole2 2 (cut)
    with BuildSketch(Plane(origin=(0, 0, 0), x_dir=(0.819152044288991, 0, 0.5735764363510472), z_dir=(0.5735764363510472, 0, -0.8191520442889911)).offset(ADVANCEDHOLE2_START_2)):
        with Locations((-34.414586181, 30)):
            Circle(ADVANCEDHOLE2_2_OUTLINE_R)
        with Locations((-34.414586181, -15)):
            Circle(ADVANCEDHOLE2_2_OUTLINE_R)
    extrude(amount=ADVANCEDHOLE2_2_DEPTH, mode=Mode.SUBTRACT)

    # Sketch11 → Cut-Extrude1 (cut)
    with BuildSketch(Plane.XY):
        with Locations((-24, 0)):
            Rectangle(SKETCH11_W, SKETCH11_H)
    extrude(amount=-CUT_EXTRUDE1_DEPTH, mode=Mode.SUBTRACT)

    # M4 Tapped Hole1
    with Locations(Plane(origin=(23, 30, 5), x_dir=(0, 1, 0), z_dir=(1, 0, 0))):
        with Locations((0, 0), (-60, 0), (-30, 0)):
            Hole(M4_TAPPED_HOLE1_D / 2, depth=M4_TAPPED_HOLE1_DEPTH)
            with Locations((0, 0, -(M4_TAPPED_HOLE1_DEPTH + M4_TAPPED_HOLE1_TIP / 2))):  # 118° drill point
                Cone(0, M4_TAPPED_HOLE1_D / 2, M4_TAPPED_HOLE1_TIP, mode=Mode.SUBTRACT)

    # M4 Tapped Hole1 on face 2
    with Locations(Plane(origin=(-23, 30, 5), x_dir=(0, 0, -1), z_dir=(-1, 0, 0))):
        with Locations((0, 0), (0, 60), (0, 30)):
            Hole(M4_TAPPED_HOLE1_ON_FACE_2_D / 2, depth=M4_TAPPED_HOLE1_ON_FACE_2_DEPTH)
            with Locations((0, 0, -(M4_TAPPED_HOLE1_ON_FACE_2_DEPTH + M4_TAPPED_HOLE1_ON_FACE_2_TIP / 2))):  # 118° drill point
                Cone(0, M4_TAPPED_HOLE1_ON_FACE_2_D / 2, M4_TAPPED_HOLE1_ON_FACE_2_TIP, mode=Mode.SUBTRACT)

    # M4 Tapped Hole1 on face 3
    with Locations(Plane(origin=(10.2, 38, 5), x_dir=(0, 0, 1), z_dir=(0, 1, 0))):
        with Locations((0, 0), (0, -20.4)):
            Hole(M4_TAPPED_HOLE1_ON_FACE_3_D / 2, depth=M4_TAPPED_HOLE1_ON_FACE_3_DEPTH)
            with Locations((0, 0, -(M4_TAPPED_HOLE1_ON_FACE_3_DEPTH + M4_TAPPED_HOLE1_ON_FACE_3_TIP / 2))):  # 118° drill point
                Cone(0, M4_TAPPED_HOLE1_ON_FACE_3_D / 2, M4_TAPPED_HOLE1_ON_FACE_3_TIP, mode=Mode.SUBTRACT)

    # M4 Tapped Hole1 on face 4
    with Locations(Plane(origin=(-10.2, -38, 5), x_dir=(0, 0, -1), z_dir=(0, -1, 0))):
        with Locations((0, 0), (0, 20.4)):
            Hole(M4_TAPPED_HOLE1_ON_FACE_4_D / 2, depth=M4_TAPPED_HOLE1_ON_FACE_4_DEPTH)
            with Locations((0, 0, -(M4_TAPPED_HOLE1_ON_FACE_4_DEPTH + M4_TAPPED_HOLE1_ON_FACE_4_TIP / 2))):  # 118° drill point
                Cone(0, M4_TAPPED_HOLE1_ON_FACE_4_D / 2, M4_TAPPED_HOLE1_ON_FACE_4_TIP, mode=Mode.SUBTRACT)

    # Chamfer1
    chamfer1_edges = [part.edges().sort_by_distance(p)[0] for p in [
        (23, -38, 5),
        (23, 38, 5),
        (-23, 38, 4.5),
        (-23, -38, 4.5),
    ]]
    chamfer(chamfer1_edges, length=CHAMFER1_SIZE)

    # Chamfer2
    chamfer2_edges = [part.edges().sort_by_distance(p)[0] for p in [
        (23, 0, 10),
        (0, -38, 10),
        (0, 38, 10),
        (-23, 0, 10),
        (21.6, 36.6, 10),
        (-21.6, 36.6, 10),
        (-21.6, -36.6, 10),
        (21.6, -36.6, 10),
    ]]
    chamfer2_side = [part.faces().sort_by_distance(p)[0] for p in [
        (0, 0, 10),
    ]]
    chamfer(chamfer2_edges, length=CHAMFER2_SIZE, length2=CHAMFER2_SIZE2, reference=chamfer2_side[0])


solid = part.part
